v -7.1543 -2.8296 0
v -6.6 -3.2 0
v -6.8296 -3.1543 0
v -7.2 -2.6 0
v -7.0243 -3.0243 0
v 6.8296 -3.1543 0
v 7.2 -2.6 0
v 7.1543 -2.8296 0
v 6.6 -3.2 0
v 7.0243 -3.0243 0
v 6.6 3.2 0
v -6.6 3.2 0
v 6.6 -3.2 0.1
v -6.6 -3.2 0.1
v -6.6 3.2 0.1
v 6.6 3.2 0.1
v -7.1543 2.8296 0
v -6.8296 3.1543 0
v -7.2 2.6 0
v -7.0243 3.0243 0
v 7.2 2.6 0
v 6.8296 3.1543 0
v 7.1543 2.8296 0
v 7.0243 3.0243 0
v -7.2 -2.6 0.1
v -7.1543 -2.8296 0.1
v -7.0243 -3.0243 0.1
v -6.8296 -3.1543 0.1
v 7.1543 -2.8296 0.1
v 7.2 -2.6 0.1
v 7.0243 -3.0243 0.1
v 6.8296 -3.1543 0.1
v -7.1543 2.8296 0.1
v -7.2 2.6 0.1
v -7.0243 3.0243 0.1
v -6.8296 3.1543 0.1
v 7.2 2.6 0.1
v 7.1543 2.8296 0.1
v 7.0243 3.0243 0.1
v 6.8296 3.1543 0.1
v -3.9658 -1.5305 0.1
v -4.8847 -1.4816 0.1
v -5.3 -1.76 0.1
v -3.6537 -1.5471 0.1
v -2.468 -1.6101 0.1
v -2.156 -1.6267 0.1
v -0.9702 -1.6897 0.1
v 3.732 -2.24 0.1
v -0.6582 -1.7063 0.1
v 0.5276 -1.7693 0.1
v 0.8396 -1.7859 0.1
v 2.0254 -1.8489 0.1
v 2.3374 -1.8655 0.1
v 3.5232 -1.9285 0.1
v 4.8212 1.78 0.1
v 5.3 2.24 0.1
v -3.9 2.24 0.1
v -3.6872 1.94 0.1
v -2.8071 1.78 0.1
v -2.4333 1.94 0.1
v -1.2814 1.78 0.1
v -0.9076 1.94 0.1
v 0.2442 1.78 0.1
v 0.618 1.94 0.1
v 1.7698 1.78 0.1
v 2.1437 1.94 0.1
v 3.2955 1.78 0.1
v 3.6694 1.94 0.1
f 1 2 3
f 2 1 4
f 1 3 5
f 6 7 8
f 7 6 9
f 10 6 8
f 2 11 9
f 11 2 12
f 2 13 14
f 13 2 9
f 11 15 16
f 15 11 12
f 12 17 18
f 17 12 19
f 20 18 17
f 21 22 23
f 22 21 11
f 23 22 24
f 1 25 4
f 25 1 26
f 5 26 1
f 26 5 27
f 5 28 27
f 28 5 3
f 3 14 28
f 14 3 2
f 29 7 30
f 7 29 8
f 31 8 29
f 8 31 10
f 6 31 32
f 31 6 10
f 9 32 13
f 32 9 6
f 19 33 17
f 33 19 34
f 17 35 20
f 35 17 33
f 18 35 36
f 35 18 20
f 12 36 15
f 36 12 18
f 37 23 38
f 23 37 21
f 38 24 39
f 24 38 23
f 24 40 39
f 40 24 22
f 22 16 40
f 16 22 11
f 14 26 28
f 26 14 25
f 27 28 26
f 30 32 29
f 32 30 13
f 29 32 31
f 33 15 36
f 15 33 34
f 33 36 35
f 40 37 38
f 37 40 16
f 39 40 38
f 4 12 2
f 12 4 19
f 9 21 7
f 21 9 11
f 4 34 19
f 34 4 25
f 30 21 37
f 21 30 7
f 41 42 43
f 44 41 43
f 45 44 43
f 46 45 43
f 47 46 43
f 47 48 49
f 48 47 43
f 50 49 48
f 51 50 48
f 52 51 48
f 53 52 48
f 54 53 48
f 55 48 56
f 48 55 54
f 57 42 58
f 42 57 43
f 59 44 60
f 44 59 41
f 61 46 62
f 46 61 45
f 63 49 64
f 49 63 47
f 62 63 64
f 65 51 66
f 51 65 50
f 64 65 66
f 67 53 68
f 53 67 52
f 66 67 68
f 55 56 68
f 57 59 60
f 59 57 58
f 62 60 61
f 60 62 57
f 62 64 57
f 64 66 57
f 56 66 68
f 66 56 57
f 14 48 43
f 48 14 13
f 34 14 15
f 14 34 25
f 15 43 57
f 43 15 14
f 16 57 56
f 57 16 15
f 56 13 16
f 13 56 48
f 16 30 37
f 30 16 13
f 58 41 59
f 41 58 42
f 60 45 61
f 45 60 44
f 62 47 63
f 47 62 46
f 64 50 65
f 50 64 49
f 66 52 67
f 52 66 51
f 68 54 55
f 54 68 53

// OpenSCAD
// file: ../p/box3u12.scad
use <../lib.scad>
function ldraw_lib__box3u12() = [
// 0 Box with 3 Parallel Faces without Any Edges
// 0 Name: box3u12.dat
// 0 Author: J.C. Tchang [tchang]
// 0 !LDRAW_ORG Primitive UPDATE 2014-02
// 0 !LICENSE Licensed under CC BY 4.0 : see CAreadme.txt
// 
// 0 BFC CERTIFY CCW
  [0,"BFC","CERTIFY"],
  [0,"BFC","CCW"],
// 
// 0 !HISTORY 2014-12-23 [PTadmin] Official Update 2014-02
// 
// 
// 4 16 -1 1 1 1 1 1 1 1 -1 -1 1 -1
  [4,16,-1,1,1,1,1,1,1,1,-1,-1,1,-1],
// 4 16 -1 1 1 -1 0 1 1 0 1 1 1 1
  [4,16,-1,1,1,-1,0,1,1,0,1,1,1,1],
// 4 16 1 1 -1 1 0 -1 -1 0 -1 -1 1 -1
  [4,16,1,1,-1,1,0,-1,-1,0,-1,-1,1,-1],
];
module ldraw_lib__box3u12(step=0, col=false, unit=2/5, alt=false, line=0.2, solid=!$preview)
    makepoly(ldraw_lib__box3u12(), step=step, col=col, unit=unit, alt=alt, line=line, solid=solid);
ldraw_lib__box3u12(line=0.2);
// file: ../p/1-4cyli.scad
use <../lib.scad>
function ldraw_lib__1_4cyli() = [
// 0 Cylinder 0.25
// 0 Name: 1-4cyli.dat
// 0 Author: James Jessiman
// 0 !LDRAW_ORG Primitive UPDATE 2012-01
// 0 !LICENSE Licensed under CC BY 4.0 : see CAreadme.txt
// 
// 0 BFC CERTIFY CCW
  [0,"BFC","CERTIFY"],
  [0,"BFC","CCW"],
// 
// 0 !HISTORY 2002-03-23 [sbliss] Added BFC statement.
// 0 !HISTORY 2002-04-25 [PTadmin] Official Update 2002-02
// 0 !HISTORY 2007-06-22 [PTadmin] Header formatted for Contributor Agreement
// 0 !HISTORY 2008-07-01 [PTadmin] Official Update 2008-01
// 0 !HISTORY 2012-02-16 [Philo] Changed to CCW
// 0 !HISTORY 2012-03-30 [PTadmin] Official Update 2012-01
// 
// 
// 4 16 1 1 0 0.9239 1 0.3827 0.9239 0 0.3827 1 0 0
  [4,16,1,1,0,0.9239,1,0.3827,0.9239,0,0.3827,1,0,0],
// 5 24 1 0 0 1 1 0 0.9239 0 0.3827 1 0 -1
  [5,24,1,0,0,1,1,0,0.9239,0,0.3827,1,0,-1],
// 4 16 0.9239 1 0.3827 0.7071 1 0.7071 0.7071 0 0.7071 0.9239 0 0.3827
  [4,16,0.9239,1,0.3827,0.7071,1,0.7071,0.7071,0,0.7071,0.9239,0,0.3827],
// 5 24 0.9239 0 0.3827 0.9239 1 0.3827 0.7071 0 0.7071 1 0 0
  [5,24,0.9239,0,0.3827,0.9239,1,0.3827,0.7071,0,0.7071,1,0,0],
// 4 16 0.7071 1 0.7071 0.3827 1 0.9239 0.3827 0 0.9239 0.7071 0 0.7071
  [4,16,0.7071,1,0.7071,0.3827,1,0.9239,0.3827,0,0.9239,0.7071,0,0.7071],
// 5 24 0.7071 0 0.7071 0.7071 1 0.7071 0.3827 0 0.9239 0.9239 0 0.3827
  [5,24,0.7071,0,0.7071,0.7071,1,0.7071,0.3827,0,0.9239,0.9239,0,0.3827],
// 4 16 0.3827 1 0.9239 0 1 1 0 0 1 0.3827 0 0.9239
  [4,16,0.3827,1,0.9239,0,1,1,0,0,1,0.3827,0,0.9239],
// 5 24 0.3827 0 0.9239 0.3827 1 0.9239 0 0 1 0.7071 0 0.7071
  [5,24,0.3827,0,0.9239,0.3827,1,0.9239,0,0,1,0.7071,0,0.7071],
// 5 24 0 0 1 0 1 1 0.3827 0 0.9239 -1 0 1
  [5,24,0,0,1,0,1,1,0.3827,0,0.9239,-1,0,1],
];
module ldraw_lib__1_4cyli(step=0, col=false, unit=2/5, alt=false, line=0.2, solid=!$preview)
    makepoly(ldraw_lib__1_4cyli(), step=step, col=col, unit=unit, alt=alt, line=line, solid=solid);
ldraw_lib__1_4cyli(line=0.2);
// file: ../p/1-4chrd.scad
use <../lib.scad>
function ldraw_lib__1_4chrd() = [
// 0 Chord 0.25
// 0 Name: 1-4chrd.dat
// 0 Author: Max Martin Richter [MMR1988]
// 0 !LDRAW_ORG Primitive UPDATE 2023-05
// 0 !LICENSE Licensed under CC BY 4.0 : see CAreadme.txt
// 
// 0 BFC CERTIFY CCW
  [0,"BFC","CERTIFY"],
  [0,"BFC","CCW"],
// 
// 0 !HISTORY 2004-04-22 [PTadmin] Official Update 2004-02
// 0 !HISTORY 2007-10-09 [PTadmin] Header formatted for Contributor Agreement
// 0 !HISTORY 2008-07-01 [PTadmin] Official Update 2008-01
// 0 !HISTORY 2012-08-02 [MMR1988] Re-creation with PrimGen2 and Rectifier
// 0 !HISTORY 2012-08-09 [PTadmin] Official Update 2012-02
// 0 !HISTORY 2023-10-27 [OrionP] Change author to MMR1988 from hafhead
// 0 !HISTORY 2023-10-31 [OrionP] Official Update 2023-05
// 
// 4 16 0.9239 0 0.3827 0.3827 0 0.9239 0 0 1 1 0 0
  [4,16,0.9239,0,0.3827,0.3827,0,0.9239,0,0,1,1,0,0],
// 3 16 0.7071 0 0.7071 0.3827 0 0.9239 0.9239 0 0.3827
  [3,16,0.7071,0,0.7071,0.3827,0,0.9239,0.9239,0,0.3827],
];
module ldraw_lib__1_4chrd(step=0, col=false, unit=2/5, alt=false, line=0.2, solid=!$preview)
    makepoly(ldraw_lib__1_4chrd(), step=step, col=col, unit=unit, alt=alt, line=line, solid=solid);
ldraw_lib__1_4chrd(line=0.2);
// main file
use <../lib.scad>
use <6142271m.scad>
function ldraw_lib__6142271n() = [
// 0 Sticker  0.8 x  1.8 with Black Air Vents on White Background Left
// 0 Name: 6142271n.dat
// 0 Author: Massimo Maso [Sirio]
// 0 !LDRAW_ORG Part UPDATE 2025-03
// 0 !LICENSE Licensed under CC BY 4.0 : see CAreadme.txt
// 
// 0 BFC CERTIFY CCW
  [0,"BFC","CERTIFY"],
  [0,"BFC","CCW"],
// 
// 0 !KEYWORDS Audi, Bricklink 75873stk01a, Brickowl 427960, LMS, R8
// 0 !KEYWORDS Rebrickable 24755, Set 75873, Speed Champions, Ultra
// 
// 0 !HISTORY 2025-03-30 [OrionP] Official Update 2025-03
// 
// 
// 1 16 0 0 0 1 0 0 0 1 0 0 0 -1 6142271m.dat
  [1,16,0,0,0,1,0,0,0,1,0,0,0,-1, ldraw_lib__6142271m()],
];
module ldraw_lib__6142271n(step=0, col=false, unit=2/5, alt=false, line=0.2, solid=!$preview)
    makepoly(ldraw_lib__6142271n(), step=step, col=col, unit=unit, alt=alt, line=line, solid=solid);
ldraw_lib__6142271n(line=0.2);
